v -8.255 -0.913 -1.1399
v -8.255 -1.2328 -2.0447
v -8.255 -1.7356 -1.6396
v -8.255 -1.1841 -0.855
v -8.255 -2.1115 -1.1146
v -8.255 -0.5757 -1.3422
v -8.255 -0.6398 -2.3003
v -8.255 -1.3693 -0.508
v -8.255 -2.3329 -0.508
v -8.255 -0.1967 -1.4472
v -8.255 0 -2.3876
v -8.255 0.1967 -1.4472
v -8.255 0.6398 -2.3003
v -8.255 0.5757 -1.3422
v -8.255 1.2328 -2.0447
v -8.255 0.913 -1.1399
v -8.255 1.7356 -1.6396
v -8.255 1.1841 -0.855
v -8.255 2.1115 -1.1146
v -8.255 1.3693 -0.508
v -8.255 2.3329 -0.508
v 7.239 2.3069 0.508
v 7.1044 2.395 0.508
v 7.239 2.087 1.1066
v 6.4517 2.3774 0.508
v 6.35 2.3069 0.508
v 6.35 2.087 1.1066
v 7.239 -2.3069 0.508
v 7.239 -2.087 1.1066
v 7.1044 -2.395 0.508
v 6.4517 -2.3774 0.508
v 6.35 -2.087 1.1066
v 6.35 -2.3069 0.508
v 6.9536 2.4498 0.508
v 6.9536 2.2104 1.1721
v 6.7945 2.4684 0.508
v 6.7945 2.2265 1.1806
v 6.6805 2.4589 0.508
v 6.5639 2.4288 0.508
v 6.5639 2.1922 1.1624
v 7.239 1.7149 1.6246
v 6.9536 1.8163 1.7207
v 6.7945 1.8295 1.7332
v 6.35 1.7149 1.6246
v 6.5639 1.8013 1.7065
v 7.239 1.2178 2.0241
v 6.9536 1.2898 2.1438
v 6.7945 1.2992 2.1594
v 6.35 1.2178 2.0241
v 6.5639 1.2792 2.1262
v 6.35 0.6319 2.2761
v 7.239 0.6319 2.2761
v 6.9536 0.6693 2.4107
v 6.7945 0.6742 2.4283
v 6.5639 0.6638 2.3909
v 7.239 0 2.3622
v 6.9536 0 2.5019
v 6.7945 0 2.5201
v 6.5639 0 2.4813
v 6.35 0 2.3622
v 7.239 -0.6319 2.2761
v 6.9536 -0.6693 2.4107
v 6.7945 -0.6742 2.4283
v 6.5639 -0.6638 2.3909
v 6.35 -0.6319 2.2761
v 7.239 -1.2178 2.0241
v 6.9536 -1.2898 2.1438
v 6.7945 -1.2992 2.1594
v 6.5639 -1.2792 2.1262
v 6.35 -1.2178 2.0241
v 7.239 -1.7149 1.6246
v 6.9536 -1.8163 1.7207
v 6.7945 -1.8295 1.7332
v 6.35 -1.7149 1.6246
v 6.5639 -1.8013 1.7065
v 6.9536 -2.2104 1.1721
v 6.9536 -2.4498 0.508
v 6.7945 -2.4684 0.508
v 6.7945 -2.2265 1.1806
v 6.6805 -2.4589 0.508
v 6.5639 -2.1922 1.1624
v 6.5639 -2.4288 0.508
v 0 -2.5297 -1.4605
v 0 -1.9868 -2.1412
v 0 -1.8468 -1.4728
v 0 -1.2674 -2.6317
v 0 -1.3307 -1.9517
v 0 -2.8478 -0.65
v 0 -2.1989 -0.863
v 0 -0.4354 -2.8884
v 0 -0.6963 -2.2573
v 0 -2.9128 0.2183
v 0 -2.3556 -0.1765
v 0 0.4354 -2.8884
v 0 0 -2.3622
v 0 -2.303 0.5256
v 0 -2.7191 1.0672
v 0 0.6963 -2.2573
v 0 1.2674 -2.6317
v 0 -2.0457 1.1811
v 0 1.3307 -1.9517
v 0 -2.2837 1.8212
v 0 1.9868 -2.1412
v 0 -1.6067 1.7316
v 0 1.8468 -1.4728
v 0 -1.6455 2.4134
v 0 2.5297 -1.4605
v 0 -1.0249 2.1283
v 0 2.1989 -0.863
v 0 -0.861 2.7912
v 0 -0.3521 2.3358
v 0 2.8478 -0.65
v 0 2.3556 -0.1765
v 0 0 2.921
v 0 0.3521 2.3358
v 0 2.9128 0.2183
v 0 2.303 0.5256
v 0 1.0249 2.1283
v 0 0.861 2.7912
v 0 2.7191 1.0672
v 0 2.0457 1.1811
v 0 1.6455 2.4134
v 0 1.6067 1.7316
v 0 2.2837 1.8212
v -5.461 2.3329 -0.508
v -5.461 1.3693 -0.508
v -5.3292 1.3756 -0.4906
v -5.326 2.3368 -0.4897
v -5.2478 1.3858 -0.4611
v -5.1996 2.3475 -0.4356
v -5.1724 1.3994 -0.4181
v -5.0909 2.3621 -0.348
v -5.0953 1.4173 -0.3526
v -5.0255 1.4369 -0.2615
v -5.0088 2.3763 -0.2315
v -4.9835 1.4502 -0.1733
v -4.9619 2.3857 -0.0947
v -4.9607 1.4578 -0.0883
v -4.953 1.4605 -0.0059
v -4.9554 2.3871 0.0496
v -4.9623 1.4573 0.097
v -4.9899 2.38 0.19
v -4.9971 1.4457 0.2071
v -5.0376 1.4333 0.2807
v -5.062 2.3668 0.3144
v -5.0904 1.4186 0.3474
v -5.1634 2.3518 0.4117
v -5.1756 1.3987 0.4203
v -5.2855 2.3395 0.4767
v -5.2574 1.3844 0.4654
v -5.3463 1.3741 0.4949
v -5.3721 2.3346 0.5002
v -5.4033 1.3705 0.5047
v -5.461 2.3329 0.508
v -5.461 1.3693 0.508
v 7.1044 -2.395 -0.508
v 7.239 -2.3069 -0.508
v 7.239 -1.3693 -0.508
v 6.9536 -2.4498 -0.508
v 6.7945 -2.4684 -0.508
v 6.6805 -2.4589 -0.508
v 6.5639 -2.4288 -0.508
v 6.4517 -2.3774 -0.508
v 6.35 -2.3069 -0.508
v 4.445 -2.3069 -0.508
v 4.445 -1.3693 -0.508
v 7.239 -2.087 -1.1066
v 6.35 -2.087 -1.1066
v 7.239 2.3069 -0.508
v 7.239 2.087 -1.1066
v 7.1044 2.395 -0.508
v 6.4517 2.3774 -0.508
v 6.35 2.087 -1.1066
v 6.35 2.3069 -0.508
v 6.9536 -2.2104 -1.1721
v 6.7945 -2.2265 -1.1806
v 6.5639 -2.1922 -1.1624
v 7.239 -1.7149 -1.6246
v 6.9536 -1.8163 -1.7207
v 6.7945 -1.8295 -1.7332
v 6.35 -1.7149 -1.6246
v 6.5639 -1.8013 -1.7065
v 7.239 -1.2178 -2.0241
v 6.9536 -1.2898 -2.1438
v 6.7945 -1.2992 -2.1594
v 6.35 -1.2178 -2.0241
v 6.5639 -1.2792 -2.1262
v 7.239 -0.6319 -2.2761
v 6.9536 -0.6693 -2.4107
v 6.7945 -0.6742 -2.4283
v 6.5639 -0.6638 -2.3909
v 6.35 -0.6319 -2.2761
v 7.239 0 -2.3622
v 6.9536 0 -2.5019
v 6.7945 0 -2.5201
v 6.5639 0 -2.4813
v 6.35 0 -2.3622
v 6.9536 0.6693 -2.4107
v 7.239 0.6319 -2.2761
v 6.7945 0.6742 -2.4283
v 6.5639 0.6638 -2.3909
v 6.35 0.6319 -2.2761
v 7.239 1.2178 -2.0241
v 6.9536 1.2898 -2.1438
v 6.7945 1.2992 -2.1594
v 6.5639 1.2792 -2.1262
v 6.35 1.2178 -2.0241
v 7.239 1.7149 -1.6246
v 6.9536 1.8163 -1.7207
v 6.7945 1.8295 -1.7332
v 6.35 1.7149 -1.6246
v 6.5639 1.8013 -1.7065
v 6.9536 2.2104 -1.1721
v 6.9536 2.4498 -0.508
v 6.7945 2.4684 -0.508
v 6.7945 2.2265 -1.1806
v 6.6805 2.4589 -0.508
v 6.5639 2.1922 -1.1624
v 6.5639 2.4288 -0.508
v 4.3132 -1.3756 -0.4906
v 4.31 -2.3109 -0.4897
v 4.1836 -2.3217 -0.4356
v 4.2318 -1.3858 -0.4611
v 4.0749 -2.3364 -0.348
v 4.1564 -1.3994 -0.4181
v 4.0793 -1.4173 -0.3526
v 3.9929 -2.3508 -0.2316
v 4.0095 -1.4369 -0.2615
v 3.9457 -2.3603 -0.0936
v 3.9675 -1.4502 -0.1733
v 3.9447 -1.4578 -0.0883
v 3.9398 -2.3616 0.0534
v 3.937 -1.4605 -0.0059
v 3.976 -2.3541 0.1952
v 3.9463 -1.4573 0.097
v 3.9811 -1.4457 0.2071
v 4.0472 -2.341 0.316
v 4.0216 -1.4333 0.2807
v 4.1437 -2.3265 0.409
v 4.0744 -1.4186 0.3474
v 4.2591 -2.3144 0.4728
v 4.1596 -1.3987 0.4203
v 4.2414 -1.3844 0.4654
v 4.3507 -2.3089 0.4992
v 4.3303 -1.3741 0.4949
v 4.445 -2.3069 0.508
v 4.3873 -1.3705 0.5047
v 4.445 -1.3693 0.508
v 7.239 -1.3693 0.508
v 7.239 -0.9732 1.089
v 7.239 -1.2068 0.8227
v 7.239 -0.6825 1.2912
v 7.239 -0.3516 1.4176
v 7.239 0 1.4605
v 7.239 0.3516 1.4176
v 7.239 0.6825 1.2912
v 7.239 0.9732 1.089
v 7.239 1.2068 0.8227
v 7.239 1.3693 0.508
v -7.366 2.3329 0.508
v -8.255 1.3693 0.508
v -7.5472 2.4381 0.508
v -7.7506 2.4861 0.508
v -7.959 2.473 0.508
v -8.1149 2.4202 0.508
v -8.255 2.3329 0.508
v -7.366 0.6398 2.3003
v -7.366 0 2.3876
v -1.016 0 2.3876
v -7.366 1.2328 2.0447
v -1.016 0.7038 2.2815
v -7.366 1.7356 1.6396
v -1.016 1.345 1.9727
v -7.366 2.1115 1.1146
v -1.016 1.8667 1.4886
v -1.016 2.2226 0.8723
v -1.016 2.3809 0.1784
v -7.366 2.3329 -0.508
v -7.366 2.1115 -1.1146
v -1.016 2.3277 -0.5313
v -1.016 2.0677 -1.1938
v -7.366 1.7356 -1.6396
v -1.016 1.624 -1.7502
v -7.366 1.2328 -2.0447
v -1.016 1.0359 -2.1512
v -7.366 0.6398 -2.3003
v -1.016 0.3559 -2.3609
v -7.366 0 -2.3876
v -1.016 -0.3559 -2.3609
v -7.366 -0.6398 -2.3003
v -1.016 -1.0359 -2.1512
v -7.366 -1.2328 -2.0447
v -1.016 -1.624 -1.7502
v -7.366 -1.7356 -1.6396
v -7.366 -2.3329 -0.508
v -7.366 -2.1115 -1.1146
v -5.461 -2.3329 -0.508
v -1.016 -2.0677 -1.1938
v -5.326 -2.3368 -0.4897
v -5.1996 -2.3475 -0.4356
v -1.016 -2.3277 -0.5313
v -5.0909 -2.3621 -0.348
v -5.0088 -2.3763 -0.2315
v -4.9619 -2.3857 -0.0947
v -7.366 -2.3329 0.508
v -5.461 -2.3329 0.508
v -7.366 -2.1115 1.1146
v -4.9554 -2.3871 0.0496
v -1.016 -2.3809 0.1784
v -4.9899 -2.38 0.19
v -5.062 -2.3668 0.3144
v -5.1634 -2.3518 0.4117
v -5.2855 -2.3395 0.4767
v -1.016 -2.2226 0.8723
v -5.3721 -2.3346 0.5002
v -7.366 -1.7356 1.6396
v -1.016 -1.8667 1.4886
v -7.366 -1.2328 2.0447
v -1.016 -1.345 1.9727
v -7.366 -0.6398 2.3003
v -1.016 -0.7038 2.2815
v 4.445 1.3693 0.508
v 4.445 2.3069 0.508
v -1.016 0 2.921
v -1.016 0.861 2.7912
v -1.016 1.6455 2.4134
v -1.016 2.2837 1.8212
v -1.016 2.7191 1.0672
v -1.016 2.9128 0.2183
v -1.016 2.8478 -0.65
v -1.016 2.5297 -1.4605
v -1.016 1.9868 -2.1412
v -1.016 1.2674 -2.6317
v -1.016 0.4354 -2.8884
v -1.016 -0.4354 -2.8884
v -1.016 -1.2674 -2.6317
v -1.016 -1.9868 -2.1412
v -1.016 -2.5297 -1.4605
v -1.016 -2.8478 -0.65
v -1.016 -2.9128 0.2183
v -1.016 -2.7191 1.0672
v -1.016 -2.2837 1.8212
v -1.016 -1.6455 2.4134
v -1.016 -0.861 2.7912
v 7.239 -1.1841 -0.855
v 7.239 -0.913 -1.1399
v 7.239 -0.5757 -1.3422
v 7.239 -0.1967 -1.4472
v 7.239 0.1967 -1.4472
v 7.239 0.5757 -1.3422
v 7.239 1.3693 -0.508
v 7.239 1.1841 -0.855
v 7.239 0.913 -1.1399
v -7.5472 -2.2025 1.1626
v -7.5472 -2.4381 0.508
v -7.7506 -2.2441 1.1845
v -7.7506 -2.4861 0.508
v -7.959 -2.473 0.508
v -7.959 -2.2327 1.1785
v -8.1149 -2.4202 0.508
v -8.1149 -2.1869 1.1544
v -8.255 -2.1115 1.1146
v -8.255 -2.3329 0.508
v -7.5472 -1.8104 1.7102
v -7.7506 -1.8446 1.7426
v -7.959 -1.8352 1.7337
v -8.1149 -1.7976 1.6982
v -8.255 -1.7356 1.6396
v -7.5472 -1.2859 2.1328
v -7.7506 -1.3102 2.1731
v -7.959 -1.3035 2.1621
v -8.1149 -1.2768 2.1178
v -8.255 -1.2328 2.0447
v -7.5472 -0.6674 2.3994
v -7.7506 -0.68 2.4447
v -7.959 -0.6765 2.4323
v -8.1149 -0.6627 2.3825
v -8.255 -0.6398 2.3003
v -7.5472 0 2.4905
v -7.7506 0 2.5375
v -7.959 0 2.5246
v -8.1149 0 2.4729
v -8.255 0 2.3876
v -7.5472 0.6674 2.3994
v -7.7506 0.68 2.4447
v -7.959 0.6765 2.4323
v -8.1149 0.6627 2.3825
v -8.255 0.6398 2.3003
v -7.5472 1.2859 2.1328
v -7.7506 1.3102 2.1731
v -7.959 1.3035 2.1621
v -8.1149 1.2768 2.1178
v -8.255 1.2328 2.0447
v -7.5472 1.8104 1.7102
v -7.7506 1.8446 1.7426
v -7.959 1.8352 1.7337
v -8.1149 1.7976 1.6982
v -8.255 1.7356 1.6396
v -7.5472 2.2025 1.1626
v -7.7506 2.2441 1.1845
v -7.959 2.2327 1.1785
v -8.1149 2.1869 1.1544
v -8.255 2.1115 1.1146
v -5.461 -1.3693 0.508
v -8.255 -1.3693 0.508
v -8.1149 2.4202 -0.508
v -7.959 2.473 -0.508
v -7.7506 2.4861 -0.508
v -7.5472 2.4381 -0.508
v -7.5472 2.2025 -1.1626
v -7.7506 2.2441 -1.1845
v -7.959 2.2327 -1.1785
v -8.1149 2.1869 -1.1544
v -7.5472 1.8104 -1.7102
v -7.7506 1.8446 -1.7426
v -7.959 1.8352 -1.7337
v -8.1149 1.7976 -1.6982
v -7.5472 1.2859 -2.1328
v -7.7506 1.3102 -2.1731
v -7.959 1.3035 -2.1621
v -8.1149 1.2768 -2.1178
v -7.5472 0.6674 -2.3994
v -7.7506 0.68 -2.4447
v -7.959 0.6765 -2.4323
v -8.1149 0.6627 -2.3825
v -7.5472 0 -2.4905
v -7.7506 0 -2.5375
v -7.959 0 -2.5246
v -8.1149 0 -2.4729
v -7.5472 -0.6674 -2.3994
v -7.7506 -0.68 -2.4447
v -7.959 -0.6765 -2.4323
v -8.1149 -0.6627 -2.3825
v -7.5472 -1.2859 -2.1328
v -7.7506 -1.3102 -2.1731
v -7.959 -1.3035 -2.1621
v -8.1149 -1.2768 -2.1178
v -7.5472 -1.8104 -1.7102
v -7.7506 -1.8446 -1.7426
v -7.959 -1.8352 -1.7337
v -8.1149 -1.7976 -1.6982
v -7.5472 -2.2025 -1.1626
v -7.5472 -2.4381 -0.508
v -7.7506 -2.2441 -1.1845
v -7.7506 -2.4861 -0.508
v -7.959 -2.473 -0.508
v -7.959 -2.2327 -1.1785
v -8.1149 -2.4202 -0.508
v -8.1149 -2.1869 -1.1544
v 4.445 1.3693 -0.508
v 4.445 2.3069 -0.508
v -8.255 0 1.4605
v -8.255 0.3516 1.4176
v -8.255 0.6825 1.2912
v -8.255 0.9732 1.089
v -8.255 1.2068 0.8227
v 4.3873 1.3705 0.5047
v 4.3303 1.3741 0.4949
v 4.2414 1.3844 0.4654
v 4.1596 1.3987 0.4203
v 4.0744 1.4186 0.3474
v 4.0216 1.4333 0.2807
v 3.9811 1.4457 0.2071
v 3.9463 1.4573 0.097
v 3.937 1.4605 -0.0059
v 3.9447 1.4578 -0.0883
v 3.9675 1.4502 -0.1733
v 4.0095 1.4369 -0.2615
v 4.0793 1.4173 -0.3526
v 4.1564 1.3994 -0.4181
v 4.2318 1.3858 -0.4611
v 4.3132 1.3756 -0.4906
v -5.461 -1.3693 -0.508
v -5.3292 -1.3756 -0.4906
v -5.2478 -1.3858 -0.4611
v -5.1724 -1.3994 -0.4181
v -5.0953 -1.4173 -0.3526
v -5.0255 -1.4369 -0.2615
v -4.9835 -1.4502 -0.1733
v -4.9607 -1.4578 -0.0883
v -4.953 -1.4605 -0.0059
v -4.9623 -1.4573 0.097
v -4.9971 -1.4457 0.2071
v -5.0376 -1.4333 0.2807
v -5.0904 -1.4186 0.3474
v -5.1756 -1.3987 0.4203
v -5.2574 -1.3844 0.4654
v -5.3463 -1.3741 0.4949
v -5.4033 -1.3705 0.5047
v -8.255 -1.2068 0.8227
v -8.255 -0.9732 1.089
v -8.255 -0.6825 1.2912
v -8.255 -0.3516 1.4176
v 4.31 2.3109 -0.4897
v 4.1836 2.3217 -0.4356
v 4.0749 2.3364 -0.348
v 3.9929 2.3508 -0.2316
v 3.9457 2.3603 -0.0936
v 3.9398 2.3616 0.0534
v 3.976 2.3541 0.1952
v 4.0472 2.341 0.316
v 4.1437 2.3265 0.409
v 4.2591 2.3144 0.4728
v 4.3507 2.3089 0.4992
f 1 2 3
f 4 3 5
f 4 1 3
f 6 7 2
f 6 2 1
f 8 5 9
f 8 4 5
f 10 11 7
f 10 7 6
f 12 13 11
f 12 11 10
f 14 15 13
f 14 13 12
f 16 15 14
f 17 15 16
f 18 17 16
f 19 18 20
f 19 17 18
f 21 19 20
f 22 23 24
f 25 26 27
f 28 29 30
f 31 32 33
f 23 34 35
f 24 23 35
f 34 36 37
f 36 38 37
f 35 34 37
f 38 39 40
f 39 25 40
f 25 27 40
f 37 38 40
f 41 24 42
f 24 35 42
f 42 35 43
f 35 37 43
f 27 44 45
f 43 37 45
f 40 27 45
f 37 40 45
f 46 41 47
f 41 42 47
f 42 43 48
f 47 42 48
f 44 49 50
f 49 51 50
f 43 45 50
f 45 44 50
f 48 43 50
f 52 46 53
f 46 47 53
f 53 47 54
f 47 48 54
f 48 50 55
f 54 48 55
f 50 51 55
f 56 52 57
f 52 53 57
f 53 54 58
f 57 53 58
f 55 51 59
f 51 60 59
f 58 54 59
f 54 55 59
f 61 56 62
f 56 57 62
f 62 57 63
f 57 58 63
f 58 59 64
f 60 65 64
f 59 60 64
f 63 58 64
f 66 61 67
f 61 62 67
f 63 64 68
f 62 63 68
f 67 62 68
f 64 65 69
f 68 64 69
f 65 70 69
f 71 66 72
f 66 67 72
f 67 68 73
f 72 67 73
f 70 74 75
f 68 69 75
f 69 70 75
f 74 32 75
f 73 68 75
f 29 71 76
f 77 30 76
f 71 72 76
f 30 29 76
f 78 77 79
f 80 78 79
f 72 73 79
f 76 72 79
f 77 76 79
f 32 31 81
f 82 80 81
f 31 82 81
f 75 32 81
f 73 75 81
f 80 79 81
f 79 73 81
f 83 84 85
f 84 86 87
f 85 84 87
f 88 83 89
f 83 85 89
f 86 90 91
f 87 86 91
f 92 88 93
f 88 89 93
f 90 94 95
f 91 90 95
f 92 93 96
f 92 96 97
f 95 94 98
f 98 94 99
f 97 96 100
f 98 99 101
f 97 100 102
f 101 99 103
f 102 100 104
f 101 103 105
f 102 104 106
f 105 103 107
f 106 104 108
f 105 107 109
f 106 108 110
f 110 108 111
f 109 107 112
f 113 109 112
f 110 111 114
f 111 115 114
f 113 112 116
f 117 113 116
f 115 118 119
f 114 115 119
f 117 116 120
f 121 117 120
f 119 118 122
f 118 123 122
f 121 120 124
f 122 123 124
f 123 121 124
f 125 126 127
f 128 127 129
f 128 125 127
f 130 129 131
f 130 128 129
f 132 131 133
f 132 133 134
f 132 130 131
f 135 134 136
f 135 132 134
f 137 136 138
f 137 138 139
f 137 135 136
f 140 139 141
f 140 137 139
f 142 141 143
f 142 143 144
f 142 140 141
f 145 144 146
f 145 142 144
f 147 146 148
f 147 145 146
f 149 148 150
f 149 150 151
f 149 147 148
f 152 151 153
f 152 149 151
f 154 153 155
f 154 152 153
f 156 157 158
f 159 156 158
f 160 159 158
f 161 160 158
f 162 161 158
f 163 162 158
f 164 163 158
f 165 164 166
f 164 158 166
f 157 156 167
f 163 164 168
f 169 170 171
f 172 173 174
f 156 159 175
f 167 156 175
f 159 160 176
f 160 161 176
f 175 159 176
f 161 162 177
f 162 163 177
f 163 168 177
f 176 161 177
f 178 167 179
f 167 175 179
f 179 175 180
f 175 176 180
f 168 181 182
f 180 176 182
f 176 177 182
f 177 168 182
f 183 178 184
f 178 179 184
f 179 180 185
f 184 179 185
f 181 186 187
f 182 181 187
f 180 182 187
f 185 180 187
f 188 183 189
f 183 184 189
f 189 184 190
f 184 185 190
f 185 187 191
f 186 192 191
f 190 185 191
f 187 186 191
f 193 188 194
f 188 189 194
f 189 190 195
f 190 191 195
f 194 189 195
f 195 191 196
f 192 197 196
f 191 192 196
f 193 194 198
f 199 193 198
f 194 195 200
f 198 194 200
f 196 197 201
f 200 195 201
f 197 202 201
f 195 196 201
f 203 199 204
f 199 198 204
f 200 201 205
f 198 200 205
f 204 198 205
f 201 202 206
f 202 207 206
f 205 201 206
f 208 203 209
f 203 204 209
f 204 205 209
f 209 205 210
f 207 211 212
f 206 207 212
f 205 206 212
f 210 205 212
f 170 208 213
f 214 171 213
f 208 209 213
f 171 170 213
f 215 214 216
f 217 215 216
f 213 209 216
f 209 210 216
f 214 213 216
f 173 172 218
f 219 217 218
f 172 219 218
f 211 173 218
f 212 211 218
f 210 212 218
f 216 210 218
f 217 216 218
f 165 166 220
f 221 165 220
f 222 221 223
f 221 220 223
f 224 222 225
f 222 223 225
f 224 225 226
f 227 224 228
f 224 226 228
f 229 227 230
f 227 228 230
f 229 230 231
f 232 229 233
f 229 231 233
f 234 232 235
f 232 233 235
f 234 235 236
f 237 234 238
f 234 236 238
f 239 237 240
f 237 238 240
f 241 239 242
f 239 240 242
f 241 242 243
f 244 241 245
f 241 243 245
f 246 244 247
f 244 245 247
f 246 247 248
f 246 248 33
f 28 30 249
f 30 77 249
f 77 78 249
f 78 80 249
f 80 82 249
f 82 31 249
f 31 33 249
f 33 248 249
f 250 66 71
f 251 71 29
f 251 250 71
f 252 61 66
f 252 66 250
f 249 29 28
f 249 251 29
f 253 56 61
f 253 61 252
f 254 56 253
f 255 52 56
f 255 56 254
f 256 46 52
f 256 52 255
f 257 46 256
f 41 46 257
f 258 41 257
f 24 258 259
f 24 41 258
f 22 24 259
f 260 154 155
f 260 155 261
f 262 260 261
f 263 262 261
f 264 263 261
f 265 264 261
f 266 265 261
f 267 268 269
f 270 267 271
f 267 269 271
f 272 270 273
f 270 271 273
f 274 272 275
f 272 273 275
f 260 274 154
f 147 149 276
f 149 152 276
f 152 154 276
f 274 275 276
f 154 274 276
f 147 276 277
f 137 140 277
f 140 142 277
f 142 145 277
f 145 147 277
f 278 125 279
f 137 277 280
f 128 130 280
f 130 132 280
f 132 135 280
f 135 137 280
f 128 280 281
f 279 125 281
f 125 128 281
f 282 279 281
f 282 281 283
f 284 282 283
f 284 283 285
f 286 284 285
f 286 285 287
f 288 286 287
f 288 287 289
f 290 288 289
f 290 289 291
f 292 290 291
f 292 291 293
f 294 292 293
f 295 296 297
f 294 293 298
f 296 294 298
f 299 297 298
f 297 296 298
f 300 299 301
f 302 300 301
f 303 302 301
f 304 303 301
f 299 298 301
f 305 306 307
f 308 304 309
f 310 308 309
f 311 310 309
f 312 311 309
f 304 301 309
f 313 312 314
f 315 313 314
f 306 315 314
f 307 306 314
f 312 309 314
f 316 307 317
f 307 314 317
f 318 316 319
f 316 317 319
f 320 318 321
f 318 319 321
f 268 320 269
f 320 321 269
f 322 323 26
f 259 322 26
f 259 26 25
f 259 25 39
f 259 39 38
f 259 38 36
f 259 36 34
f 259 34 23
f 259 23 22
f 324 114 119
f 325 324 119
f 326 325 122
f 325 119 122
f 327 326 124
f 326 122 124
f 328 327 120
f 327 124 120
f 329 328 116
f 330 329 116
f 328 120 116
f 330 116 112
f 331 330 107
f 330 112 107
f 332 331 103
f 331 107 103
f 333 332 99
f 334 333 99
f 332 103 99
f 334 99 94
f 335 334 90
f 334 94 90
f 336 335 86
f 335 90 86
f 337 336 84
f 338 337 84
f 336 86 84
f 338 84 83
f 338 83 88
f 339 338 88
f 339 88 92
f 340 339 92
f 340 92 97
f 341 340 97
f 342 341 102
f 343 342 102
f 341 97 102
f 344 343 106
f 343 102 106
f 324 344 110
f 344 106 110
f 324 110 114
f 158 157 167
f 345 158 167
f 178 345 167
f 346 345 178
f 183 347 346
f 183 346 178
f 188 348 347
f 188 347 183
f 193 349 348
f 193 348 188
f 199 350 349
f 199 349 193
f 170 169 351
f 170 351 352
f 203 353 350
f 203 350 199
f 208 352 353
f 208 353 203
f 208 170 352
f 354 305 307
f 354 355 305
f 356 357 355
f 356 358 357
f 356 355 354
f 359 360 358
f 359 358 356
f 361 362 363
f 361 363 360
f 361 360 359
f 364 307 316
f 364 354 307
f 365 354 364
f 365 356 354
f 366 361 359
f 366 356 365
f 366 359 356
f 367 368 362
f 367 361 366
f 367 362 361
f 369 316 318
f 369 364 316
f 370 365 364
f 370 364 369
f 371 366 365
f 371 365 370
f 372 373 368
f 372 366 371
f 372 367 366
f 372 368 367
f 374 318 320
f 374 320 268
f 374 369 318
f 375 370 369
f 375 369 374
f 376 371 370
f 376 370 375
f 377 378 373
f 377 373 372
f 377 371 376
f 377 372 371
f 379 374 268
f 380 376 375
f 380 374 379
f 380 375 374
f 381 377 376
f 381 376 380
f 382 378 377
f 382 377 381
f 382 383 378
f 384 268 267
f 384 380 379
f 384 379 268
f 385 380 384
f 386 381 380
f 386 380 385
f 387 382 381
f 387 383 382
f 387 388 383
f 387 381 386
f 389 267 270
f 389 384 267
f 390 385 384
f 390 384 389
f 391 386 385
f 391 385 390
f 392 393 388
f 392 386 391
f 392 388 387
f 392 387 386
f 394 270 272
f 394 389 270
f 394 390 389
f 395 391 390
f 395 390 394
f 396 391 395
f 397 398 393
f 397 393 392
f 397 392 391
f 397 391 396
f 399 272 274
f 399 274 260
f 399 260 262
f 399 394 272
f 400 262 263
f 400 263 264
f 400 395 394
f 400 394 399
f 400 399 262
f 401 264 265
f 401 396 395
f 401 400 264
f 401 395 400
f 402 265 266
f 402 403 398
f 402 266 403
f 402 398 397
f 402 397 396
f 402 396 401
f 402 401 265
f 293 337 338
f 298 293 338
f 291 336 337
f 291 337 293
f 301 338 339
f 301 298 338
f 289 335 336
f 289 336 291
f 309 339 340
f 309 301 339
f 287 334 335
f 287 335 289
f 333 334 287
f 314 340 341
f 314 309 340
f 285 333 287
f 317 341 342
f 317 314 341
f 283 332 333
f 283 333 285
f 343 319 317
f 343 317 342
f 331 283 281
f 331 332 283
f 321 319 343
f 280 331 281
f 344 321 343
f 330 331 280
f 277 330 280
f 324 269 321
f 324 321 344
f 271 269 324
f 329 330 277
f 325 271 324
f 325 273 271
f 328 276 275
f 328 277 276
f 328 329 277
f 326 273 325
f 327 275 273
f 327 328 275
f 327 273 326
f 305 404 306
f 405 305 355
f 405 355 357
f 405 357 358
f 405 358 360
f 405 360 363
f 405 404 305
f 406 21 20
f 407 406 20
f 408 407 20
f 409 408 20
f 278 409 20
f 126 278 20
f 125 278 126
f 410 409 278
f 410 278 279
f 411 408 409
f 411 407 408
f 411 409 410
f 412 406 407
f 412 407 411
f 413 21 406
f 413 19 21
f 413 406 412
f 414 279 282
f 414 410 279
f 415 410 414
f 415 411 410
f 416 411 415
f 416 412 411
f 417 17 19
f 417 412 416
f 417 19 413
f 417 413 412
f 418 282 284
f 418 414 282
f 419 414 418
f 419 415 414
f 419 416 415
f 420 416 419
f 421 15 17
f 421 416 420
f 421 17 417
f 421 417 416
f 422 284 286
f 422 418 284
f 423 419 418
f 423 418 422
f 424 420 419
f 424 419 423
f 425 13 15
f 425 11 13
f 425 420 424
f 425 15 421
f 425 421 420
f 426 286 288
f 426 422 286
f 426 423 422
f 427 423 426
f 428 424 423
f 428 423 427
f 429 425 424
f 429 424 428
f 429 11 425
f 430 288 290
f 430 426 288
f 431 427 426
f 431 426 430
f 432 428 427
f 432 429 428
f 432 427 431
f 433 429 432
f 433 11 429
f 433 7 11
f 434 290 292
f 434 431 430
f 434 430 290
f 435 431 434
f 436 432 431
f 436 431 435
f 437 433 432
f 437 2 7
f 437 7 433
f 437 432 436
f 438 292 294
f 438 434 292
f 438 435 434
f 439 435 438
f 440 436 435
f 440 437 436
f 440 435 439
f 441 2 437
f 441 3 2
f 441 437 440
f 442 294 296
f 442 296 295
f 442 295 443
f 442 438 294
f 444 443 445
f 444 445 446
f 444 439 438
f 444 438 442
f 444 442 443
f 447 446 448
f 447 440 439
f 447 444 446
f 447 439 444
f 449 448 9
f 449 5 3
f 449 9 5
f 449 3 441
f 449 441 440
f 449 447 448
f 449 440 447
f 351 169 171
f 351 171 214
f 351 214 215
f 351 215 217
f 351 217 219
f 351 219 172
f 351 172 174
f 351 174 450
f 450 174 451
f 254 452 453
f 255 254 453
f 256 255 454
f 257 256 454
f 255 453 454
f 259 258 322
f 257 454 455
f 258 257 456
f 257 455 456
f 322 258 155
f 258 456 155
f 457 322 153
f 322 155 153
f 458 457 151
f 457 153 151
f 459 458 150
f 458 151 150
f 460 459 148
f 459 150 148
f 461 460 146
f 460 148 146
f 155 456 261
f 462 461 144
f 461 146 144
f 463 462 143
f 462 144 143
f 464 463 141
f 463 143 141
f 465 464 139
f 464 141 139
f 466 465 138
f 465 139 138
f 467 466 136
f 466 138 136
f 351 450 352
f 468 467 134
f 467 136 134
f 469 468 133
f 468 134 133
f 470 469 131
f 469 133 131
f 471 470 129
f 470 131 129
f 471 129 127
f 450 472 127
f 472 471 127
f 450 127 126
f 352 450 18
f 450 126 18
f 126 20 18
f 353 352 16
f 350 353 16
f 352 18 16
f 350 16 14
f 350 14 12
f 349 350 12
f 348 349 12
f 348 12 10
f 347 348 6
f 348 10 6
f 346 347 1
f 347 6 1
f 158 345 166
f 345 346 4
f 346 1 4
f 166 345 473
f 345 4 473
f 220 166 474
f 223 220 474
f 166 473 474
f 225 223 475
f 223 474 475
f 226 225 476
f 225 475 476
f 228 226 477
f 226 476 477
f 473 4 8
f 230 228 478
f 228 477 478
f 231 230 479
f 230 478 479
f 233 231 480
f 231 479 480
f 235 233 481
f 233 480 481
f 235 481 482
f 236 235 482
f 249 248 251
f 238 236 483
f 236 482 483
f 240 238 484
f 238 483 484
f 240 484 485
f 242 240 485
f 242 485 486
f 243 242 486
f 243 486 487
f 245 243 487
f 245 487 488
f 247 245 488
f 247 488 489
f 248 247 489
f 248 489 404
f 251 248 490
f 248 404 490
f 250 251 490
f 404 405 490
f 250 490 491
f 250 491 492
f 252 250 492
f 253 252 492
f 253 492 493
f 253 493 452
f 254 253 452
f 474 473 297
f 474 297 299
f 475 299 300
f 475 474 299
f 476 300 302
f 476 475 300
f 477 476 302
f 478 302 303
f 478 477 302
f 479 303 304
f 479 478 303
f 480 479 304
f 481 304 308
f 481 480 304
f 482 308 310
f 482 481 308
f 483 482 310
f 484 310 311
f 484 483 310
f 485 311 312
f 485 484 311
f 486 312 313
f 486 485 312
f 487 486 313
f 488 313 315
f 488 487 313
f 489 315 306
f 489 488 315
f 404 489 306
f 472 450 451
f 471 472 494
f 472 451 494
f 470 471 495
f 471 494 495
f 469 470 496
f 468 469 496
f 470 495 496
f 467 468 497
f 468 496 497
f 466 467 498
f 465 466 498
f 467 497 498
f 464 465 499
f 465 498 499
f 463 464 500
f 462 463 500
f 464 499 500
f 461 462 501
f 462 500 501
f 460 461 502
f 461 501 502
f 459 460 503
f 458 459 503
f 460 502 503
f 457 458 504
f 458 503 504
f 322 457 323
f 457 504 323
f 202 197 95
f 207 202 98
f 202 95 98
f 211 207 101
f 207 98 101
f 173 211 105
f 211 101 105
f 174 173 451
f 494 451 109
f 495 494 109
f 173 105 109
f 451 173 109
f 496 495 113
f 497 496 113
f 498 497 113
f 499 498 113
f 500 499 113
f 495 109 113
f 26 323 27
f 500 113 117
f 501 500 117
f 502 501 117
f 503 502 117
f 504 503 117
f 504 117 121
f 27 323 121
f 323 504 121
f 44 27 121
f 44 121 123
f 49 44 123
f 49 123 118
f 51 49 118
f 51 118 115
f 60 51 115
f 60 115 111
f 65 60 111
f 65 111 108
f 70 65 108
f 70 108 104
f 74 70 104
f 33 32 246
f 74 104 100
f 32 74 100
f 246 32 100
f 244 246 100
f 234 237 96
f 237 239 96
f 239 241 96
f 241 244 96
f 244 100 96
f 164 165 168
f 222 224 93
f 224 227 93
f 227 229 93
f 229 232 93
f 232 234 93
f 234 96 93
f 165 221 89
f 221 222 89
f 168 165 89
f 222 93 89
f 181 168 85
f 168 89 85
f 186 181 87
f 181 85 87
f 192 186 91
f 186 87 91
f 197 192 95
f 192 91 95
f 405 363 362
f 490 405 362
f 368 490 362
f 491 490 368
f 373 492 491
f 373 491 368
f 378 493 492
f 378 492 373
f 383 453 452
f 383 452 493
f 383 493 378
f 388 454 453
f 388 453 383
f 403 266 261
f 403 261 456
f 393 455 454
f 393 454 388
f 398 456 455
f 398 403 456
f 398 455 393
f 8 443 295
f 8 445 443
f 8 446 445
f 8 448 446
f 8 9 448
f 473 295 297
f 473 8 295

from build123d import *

# Parameters (mm, degrees)
SKETCH1_R           = 2.3622
BASE_EXTRUDE_DEPTH  = 7.239
SKETCH3_R           = 2.921
BOSS_EXTRUDE1_DEPTH = 1.016
SKETCH4_R           = 2.3876
BOSS_EXTRUDE2_DEPTH = 7.239
SKETCH7_R           = 1.4605
CUT_EXTRUDE2_DEPTH  = 17.035227504
CUT_EXTRUDE4_DEPTH  = 10.230899667


with BuildPart() as part:
    # Sketch1 → Base-Extrude (new body)
    with BuildSketch(Plane(origin=(0, 0, 0), x_dir=(0, 0, -1), z_dir=(1, 0, 0))):
        Circle(SKETCH1_R)
    extrude(amount=BASE_EXTRUDE_DEPTH)

    # Sketch3 → Boss-Extrude1 (add)
    with BuildSketch(Plane.ZY):
        Circle(SKETCH3_R)
    extrude(amount=BOSS_EXTRUDE1_DEPTH)

    # Sketch4 → Boss-Extrude2 (add)
    with BuildSketch(Plane.ZY.offset(1.016)):
        Circle(SKETCH4_R)
    extrude(amount=BOSS_EXTRUDE2_DEPTH)

    # Sketch6 → Boss-Revolve2 (revolve)
    with BuildSketch(Plane(origin=(0, 0, 0), x_dir=(1, 0, 0), z_dir=(0, 1, 0)), mode=Mode.PRIVATE) as boss_revolve2_sk:
        with BuildLine():
            Line((-8.255, 2.3876), (-7.366, 2.3876))
            ThreePointArc((-7.366, 2.3876), (-7.8105, 2.54), (-8.255, 2.3876))
        make_face()
    revolve(boss_revolve2_sk.sketch.rotate(Axis((0, 0, 0), (-1, 0, 0)), 180), axis=Axis((0, 0, 0), (-1, 0, 0)))

    # Sketch9 → Boss-Revolve3 (revolve)
    with BuildSketch(Plane(origin=(0, 0, 0), x_dir=(1, 0, 0), z_dir=(0, 1, 0)), mode=Mode.PRIVATE) as boss_revolve3_sk:
        with BuildLine():
            Line((6.35, 2.3622), (7.239, 2.3622))
            ThreePointArc((7.239, 2.3622), (6.7945, 2.520115861), (6.35, 2.3622))
        make_face()
    revolve(boss_revolve3_sk.sketch.rotate(Axis((0, 0, 0), (1, 0, 0)), 180), axis=Axis((0, 0, 0), (1, 0, 0)))

    # Sketch7 → Cut-Extrude2 (cut, through all)
    with BuildSketch(Plane.ZY.offset(8.255)):
        Circle(SKETCH7_R)
    extrude(amount=-CUT_EXTRUDE2_DEPTH, mode=Mode.SUBTRACT)

    # Sketch8 → Cut-Extrude4 (cut, symmetric)
    with BuildSketch(Plane(origin=(0, 0, 0), x_dir=(1, 0, 0), z_dir=(0, 1, 0))):
        with BuildLine():
            Line((-8.255, 0.508), (-5.461, 0.508))
            ThreePointArc((-5.461, 0.508), (-4.953, 0), (-5.461, -0.508))
            Line((-5.461, -0.508), (-8.255, -0.508))
            Line((-8.255, -0.508), (-8.255, 0.508))
        make_face()
    cut_extrude4 = extrude(amount=CUT_EXTRUDE4_DEPTH, both=True, mode=Mode.SUBTRACT)

    # Mirror7: Cut-Extrude4 across plane
    add(cut_extrude4.mirror(Plane(origin=(-0.508, 0, 0), x_dir=(0, 0, 1), z_dir=(1, 0, 0))), mode=Mode.SUBTRACT)


solid = part.part
